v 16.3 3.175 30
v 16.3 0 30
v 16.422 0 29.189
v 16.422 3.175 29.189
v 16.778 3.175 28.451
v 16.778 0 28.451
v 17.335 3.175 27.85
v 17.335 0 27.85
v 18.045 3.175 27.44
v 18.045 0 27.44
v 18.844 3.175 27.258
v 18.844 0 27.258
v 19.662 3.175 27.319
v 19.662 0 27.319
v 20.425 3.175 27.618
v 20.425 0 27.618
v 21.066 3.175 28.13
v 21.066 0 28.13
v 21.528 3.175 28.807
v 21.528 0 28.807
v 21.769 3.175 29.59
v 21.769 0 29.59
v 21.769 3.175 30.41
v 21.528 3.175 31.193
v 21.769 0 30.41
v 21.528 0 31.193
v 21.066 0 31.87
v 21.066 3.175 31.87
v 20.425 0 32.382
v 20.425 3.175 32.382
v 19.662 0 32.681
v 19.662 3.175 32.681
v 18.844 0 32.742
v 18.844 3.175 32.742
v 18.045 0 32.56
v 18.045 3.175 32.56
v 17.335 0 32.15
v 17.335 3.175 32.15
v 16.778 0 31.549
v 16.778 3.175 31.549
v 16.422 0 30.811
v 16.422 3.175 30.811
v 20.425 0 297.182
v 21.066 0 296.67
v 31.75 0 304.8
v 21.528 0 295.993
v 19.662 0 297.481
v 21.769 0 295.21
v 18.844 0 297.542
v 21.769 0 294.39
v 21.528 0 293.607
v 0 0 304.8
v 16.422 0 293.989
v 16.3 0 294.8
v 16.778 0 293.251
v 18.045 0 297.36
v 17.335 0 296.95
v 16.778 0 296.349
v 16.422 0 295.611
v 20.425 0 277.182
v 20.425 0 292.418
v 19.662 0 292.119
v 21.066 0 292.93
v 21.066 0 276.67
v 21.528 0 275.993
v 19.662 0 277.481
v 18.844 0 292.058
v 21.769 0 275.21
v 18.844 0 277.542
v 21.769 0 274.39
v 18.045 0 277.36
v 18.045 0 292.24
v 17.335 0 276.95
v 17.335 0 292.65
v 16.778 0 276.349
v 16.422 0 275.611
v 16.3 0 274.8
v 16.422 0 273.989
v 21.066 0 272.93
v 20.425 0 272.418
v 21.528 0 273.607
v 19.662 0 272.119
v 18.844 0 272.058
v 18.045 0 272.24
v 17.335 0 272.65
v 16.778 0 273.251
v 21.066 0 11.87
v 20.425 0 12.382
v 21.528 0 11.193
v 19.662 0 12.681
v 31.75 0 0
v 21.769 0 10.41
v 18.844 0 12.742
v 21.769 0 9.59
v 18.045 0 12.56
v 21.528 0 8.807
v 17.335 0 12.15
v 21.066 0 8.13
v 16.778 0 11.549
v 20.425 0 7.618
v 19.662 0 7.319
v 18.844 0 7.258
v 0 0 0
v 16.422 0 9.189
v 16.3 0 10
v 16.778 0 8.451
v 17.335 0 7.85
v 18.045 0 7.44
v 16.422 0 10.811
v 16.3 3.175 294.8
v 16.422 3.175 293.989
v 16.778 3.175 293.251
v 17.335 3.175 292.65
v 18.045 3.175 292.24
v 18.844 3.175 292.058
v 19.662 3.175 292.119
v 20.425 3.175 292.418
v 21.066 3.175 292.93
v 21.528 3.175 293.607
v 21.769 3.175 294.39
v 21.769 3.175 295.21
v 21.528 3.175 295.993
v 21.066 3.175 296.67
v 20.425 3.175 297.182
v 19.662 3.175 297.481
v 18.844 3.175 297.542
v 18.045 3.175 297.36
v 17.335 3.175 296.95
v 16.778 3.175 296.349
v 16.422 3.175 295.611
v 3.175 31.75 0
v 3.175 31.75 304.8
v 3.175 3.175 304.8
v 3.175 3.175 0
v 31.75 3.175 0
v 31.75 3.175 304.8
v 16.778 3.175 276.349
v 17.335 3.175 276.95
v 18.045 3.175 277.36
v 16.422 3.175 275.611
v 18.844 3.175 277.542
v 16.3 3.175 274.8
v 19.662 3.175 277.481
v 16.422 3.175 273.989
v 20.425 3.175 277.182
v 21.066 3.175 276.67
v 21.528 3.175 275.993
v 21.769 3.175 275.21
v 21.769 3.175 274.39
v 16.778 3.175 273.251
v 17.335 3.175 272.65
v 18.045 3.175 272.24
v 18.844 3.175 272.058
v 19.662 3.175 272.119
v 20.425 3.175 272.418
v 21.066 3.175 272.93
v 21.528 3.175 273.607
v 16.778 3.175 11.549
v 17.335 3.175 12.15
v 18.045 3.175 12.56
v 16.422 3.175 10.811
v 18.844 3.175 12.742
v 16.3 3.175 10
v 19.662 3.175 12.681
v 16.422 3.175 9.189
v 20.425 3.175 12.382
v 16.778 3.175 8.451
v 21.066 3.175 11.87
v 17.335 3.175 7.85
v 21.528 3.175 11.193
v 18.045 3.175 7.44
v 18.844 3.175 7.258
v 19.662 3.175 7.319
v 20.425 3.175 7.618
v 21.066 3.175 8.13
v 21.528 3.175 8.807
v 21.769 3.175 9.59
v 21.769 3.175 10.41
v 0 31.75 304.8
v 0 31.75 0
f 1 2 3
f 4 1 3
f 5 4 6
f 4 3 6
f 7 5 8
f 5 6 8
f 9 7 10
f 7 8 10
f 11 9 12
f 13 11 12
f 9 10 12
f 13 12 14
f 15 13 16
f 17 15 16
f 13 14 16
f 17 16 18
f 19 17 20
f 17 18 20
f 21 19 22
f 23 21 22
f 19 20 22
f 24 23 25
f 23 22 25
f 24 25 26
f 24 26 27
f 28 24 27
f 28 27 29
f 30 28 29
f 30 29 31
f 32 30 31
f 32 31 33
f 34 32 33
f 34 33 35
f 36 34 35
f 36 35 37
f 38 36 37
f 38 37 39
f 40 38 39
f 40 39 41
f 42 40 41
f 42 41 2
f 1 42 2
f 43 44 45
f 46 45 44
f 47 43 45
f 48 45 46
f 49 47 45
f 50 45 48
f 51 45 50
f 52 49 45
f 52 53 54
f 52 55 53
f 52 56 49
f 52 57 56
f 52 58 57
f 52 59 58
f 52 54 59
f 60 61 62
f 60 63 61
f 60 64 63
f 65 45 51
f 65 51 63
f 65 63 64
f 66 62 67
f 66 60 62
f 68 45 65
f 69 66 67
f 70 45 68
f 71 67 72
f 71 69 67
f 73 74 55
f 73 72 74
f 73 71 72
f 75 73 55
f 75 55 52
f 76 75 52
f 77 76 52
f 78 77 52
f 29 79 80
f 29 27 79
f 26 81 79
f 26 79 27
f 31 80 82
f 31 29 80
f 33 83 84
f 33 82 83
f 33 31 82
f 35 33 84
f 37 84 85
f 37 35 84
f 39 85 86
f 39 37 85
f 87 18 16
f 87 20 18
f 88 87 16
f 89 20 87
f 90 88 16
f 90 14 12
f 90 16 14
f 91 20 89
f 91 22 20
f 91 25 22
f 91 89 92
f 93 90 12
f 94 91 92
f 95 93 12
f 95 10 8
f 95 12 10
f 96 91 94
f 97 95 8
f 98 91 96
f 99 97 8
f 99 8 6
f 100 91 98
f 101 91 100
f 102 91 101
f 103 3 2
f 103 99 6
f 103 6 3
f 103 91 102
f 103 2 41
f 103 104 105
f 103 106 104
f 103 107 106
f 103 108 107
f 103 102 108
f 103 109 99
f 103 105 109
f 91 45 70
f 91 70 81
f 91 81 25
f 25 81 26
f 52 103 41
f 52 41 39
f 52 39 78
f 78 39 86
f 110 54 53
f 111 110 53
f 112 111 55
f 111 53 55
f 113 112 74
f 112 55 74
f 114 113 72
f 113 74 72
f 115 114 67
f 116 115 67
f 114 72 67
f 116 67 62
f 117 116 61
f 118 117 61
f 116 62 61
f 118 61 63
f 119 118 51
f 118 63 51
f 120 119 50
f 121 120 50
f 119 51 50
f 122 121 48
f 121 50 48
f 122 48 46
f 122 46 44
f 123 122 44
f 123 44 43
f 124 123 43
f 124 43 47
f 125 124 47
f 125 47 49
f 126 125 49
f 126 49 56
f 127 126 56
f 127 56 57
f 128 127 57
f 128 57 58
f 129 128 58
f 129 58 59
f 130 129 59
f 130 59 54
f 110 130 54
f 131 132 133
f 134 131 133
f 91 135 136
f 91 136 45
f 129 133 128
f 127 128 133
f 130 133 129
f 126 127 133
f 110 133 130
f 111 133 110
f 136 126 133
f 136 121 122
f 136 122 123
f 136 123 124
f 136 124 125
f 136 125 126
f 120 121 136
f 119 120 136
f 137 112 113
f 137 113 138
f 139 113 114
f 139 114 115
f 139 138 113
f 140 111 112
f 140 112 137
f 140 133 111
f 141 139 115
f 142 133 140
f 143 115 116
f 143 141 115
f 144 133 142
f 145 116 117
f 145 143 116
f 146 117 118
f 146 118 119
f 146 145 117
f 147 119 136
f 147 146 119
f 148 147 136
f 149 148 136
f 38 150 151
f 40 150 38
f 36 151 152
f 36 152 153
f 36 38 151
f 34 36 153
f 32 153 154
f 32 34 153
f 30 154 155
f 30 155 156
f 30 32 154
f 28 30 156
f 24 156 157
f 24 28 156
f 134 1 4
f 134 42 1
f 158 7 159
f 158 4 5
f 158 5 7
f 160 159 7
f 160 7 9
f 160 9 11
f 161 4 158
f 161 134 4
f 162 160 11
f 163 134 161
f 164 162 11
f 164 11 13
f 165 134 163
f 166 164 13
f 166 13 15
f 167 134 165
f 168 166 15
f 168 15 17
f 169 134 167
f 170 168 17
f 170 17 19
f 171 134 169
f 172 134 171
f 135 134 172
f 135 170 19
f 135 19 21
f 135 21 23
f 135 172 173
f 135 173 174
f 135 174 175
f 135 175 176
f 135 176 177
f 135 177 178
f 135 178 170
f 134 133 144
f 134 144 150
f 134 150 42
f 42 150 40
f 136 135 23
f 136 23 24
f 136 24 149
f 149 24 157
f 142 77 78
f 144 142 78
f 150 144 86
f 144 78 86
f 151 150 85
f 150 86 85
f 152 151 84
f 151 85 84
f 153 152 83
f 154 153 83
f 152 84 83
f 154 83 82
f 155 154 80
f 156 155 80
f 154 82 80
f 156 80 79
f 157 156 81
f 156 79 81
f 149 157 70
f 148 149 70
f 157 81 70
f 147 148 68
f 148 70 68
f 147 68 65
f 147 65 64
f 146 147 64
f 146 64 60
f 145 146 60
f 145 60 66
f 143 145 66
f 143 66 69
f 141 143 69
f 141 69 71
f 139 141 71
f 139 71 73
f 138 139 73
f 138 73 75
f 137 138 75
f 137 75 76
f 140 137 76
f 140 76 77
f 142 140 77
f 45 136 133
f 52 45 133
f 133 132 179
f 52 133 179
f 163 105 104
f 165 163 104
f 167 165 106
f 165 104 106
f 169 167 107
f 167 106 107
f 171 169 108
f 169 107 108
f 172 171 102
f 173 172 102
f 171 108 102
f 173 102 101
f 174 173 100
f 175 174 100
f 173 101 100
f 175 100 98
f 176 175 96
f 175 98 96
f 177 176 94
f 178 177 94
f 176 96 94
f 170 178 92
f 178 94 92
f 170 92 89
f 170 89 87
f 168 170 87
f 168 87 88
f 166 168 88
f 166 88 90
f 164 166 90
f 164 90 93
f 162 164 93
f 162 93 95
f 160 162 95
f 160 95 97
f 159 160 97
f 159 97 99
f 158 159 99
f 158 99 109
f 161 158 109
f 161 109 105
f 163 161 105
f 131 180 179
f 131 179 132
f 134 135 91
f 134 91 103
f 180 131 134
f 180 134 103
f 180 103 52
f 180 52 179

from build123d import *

# Parameters (mm, degrees)
BOSS_EXTRUDE1_DEPTH      = 304.8
M5_CLEARANCE_HOLE1_D     = 5.5
M5_CLEARANCE_HOLE1_DEPTH = 25.4
M5_CLEARANCE_HOLE1_TIP   = 1.652366702


with BuildPart() as part:
    # Sketch1 → Boss-Extrude1 (new body)
    with BuildSketch(Plane.XY):
        Polygon((0, 0), (0, 31.75), (3.175, 31.75), (3.175, 3.175), (31.75, 3.175), (31.75, 0), align=None)
    extrude(amount=BOSS_EXTRUDE1_DEPTH)

    # M5 Clearance Hole1
    with Locations(Plane(origin=(0, 3.175, 0), x_dir=(1, 0, 0), z_dir=(0, 1, 0))):
        with Locations((19.05, -10), (19.05, -294.8), (19.05, -30), (19.05, -274.8)):
            Hole(M5_CLEARANCE_HOLE1_D / 2, depth=M5_CLEARANCE_HOLE1_DEPTH)
            with Locations((0, 0, -(M5_CLEARANCE_HOLE1_DEPTH + M5_CLEARANCE_HOLE1_TIP / 2))):  # 118° drill point
                Cone(0, M5_CLEARANCE_HOLE1_D / 2, M5_CLEARANCE_HOLE1_TIP, mode=Mode.SUBTRACT)


solid = part.part
